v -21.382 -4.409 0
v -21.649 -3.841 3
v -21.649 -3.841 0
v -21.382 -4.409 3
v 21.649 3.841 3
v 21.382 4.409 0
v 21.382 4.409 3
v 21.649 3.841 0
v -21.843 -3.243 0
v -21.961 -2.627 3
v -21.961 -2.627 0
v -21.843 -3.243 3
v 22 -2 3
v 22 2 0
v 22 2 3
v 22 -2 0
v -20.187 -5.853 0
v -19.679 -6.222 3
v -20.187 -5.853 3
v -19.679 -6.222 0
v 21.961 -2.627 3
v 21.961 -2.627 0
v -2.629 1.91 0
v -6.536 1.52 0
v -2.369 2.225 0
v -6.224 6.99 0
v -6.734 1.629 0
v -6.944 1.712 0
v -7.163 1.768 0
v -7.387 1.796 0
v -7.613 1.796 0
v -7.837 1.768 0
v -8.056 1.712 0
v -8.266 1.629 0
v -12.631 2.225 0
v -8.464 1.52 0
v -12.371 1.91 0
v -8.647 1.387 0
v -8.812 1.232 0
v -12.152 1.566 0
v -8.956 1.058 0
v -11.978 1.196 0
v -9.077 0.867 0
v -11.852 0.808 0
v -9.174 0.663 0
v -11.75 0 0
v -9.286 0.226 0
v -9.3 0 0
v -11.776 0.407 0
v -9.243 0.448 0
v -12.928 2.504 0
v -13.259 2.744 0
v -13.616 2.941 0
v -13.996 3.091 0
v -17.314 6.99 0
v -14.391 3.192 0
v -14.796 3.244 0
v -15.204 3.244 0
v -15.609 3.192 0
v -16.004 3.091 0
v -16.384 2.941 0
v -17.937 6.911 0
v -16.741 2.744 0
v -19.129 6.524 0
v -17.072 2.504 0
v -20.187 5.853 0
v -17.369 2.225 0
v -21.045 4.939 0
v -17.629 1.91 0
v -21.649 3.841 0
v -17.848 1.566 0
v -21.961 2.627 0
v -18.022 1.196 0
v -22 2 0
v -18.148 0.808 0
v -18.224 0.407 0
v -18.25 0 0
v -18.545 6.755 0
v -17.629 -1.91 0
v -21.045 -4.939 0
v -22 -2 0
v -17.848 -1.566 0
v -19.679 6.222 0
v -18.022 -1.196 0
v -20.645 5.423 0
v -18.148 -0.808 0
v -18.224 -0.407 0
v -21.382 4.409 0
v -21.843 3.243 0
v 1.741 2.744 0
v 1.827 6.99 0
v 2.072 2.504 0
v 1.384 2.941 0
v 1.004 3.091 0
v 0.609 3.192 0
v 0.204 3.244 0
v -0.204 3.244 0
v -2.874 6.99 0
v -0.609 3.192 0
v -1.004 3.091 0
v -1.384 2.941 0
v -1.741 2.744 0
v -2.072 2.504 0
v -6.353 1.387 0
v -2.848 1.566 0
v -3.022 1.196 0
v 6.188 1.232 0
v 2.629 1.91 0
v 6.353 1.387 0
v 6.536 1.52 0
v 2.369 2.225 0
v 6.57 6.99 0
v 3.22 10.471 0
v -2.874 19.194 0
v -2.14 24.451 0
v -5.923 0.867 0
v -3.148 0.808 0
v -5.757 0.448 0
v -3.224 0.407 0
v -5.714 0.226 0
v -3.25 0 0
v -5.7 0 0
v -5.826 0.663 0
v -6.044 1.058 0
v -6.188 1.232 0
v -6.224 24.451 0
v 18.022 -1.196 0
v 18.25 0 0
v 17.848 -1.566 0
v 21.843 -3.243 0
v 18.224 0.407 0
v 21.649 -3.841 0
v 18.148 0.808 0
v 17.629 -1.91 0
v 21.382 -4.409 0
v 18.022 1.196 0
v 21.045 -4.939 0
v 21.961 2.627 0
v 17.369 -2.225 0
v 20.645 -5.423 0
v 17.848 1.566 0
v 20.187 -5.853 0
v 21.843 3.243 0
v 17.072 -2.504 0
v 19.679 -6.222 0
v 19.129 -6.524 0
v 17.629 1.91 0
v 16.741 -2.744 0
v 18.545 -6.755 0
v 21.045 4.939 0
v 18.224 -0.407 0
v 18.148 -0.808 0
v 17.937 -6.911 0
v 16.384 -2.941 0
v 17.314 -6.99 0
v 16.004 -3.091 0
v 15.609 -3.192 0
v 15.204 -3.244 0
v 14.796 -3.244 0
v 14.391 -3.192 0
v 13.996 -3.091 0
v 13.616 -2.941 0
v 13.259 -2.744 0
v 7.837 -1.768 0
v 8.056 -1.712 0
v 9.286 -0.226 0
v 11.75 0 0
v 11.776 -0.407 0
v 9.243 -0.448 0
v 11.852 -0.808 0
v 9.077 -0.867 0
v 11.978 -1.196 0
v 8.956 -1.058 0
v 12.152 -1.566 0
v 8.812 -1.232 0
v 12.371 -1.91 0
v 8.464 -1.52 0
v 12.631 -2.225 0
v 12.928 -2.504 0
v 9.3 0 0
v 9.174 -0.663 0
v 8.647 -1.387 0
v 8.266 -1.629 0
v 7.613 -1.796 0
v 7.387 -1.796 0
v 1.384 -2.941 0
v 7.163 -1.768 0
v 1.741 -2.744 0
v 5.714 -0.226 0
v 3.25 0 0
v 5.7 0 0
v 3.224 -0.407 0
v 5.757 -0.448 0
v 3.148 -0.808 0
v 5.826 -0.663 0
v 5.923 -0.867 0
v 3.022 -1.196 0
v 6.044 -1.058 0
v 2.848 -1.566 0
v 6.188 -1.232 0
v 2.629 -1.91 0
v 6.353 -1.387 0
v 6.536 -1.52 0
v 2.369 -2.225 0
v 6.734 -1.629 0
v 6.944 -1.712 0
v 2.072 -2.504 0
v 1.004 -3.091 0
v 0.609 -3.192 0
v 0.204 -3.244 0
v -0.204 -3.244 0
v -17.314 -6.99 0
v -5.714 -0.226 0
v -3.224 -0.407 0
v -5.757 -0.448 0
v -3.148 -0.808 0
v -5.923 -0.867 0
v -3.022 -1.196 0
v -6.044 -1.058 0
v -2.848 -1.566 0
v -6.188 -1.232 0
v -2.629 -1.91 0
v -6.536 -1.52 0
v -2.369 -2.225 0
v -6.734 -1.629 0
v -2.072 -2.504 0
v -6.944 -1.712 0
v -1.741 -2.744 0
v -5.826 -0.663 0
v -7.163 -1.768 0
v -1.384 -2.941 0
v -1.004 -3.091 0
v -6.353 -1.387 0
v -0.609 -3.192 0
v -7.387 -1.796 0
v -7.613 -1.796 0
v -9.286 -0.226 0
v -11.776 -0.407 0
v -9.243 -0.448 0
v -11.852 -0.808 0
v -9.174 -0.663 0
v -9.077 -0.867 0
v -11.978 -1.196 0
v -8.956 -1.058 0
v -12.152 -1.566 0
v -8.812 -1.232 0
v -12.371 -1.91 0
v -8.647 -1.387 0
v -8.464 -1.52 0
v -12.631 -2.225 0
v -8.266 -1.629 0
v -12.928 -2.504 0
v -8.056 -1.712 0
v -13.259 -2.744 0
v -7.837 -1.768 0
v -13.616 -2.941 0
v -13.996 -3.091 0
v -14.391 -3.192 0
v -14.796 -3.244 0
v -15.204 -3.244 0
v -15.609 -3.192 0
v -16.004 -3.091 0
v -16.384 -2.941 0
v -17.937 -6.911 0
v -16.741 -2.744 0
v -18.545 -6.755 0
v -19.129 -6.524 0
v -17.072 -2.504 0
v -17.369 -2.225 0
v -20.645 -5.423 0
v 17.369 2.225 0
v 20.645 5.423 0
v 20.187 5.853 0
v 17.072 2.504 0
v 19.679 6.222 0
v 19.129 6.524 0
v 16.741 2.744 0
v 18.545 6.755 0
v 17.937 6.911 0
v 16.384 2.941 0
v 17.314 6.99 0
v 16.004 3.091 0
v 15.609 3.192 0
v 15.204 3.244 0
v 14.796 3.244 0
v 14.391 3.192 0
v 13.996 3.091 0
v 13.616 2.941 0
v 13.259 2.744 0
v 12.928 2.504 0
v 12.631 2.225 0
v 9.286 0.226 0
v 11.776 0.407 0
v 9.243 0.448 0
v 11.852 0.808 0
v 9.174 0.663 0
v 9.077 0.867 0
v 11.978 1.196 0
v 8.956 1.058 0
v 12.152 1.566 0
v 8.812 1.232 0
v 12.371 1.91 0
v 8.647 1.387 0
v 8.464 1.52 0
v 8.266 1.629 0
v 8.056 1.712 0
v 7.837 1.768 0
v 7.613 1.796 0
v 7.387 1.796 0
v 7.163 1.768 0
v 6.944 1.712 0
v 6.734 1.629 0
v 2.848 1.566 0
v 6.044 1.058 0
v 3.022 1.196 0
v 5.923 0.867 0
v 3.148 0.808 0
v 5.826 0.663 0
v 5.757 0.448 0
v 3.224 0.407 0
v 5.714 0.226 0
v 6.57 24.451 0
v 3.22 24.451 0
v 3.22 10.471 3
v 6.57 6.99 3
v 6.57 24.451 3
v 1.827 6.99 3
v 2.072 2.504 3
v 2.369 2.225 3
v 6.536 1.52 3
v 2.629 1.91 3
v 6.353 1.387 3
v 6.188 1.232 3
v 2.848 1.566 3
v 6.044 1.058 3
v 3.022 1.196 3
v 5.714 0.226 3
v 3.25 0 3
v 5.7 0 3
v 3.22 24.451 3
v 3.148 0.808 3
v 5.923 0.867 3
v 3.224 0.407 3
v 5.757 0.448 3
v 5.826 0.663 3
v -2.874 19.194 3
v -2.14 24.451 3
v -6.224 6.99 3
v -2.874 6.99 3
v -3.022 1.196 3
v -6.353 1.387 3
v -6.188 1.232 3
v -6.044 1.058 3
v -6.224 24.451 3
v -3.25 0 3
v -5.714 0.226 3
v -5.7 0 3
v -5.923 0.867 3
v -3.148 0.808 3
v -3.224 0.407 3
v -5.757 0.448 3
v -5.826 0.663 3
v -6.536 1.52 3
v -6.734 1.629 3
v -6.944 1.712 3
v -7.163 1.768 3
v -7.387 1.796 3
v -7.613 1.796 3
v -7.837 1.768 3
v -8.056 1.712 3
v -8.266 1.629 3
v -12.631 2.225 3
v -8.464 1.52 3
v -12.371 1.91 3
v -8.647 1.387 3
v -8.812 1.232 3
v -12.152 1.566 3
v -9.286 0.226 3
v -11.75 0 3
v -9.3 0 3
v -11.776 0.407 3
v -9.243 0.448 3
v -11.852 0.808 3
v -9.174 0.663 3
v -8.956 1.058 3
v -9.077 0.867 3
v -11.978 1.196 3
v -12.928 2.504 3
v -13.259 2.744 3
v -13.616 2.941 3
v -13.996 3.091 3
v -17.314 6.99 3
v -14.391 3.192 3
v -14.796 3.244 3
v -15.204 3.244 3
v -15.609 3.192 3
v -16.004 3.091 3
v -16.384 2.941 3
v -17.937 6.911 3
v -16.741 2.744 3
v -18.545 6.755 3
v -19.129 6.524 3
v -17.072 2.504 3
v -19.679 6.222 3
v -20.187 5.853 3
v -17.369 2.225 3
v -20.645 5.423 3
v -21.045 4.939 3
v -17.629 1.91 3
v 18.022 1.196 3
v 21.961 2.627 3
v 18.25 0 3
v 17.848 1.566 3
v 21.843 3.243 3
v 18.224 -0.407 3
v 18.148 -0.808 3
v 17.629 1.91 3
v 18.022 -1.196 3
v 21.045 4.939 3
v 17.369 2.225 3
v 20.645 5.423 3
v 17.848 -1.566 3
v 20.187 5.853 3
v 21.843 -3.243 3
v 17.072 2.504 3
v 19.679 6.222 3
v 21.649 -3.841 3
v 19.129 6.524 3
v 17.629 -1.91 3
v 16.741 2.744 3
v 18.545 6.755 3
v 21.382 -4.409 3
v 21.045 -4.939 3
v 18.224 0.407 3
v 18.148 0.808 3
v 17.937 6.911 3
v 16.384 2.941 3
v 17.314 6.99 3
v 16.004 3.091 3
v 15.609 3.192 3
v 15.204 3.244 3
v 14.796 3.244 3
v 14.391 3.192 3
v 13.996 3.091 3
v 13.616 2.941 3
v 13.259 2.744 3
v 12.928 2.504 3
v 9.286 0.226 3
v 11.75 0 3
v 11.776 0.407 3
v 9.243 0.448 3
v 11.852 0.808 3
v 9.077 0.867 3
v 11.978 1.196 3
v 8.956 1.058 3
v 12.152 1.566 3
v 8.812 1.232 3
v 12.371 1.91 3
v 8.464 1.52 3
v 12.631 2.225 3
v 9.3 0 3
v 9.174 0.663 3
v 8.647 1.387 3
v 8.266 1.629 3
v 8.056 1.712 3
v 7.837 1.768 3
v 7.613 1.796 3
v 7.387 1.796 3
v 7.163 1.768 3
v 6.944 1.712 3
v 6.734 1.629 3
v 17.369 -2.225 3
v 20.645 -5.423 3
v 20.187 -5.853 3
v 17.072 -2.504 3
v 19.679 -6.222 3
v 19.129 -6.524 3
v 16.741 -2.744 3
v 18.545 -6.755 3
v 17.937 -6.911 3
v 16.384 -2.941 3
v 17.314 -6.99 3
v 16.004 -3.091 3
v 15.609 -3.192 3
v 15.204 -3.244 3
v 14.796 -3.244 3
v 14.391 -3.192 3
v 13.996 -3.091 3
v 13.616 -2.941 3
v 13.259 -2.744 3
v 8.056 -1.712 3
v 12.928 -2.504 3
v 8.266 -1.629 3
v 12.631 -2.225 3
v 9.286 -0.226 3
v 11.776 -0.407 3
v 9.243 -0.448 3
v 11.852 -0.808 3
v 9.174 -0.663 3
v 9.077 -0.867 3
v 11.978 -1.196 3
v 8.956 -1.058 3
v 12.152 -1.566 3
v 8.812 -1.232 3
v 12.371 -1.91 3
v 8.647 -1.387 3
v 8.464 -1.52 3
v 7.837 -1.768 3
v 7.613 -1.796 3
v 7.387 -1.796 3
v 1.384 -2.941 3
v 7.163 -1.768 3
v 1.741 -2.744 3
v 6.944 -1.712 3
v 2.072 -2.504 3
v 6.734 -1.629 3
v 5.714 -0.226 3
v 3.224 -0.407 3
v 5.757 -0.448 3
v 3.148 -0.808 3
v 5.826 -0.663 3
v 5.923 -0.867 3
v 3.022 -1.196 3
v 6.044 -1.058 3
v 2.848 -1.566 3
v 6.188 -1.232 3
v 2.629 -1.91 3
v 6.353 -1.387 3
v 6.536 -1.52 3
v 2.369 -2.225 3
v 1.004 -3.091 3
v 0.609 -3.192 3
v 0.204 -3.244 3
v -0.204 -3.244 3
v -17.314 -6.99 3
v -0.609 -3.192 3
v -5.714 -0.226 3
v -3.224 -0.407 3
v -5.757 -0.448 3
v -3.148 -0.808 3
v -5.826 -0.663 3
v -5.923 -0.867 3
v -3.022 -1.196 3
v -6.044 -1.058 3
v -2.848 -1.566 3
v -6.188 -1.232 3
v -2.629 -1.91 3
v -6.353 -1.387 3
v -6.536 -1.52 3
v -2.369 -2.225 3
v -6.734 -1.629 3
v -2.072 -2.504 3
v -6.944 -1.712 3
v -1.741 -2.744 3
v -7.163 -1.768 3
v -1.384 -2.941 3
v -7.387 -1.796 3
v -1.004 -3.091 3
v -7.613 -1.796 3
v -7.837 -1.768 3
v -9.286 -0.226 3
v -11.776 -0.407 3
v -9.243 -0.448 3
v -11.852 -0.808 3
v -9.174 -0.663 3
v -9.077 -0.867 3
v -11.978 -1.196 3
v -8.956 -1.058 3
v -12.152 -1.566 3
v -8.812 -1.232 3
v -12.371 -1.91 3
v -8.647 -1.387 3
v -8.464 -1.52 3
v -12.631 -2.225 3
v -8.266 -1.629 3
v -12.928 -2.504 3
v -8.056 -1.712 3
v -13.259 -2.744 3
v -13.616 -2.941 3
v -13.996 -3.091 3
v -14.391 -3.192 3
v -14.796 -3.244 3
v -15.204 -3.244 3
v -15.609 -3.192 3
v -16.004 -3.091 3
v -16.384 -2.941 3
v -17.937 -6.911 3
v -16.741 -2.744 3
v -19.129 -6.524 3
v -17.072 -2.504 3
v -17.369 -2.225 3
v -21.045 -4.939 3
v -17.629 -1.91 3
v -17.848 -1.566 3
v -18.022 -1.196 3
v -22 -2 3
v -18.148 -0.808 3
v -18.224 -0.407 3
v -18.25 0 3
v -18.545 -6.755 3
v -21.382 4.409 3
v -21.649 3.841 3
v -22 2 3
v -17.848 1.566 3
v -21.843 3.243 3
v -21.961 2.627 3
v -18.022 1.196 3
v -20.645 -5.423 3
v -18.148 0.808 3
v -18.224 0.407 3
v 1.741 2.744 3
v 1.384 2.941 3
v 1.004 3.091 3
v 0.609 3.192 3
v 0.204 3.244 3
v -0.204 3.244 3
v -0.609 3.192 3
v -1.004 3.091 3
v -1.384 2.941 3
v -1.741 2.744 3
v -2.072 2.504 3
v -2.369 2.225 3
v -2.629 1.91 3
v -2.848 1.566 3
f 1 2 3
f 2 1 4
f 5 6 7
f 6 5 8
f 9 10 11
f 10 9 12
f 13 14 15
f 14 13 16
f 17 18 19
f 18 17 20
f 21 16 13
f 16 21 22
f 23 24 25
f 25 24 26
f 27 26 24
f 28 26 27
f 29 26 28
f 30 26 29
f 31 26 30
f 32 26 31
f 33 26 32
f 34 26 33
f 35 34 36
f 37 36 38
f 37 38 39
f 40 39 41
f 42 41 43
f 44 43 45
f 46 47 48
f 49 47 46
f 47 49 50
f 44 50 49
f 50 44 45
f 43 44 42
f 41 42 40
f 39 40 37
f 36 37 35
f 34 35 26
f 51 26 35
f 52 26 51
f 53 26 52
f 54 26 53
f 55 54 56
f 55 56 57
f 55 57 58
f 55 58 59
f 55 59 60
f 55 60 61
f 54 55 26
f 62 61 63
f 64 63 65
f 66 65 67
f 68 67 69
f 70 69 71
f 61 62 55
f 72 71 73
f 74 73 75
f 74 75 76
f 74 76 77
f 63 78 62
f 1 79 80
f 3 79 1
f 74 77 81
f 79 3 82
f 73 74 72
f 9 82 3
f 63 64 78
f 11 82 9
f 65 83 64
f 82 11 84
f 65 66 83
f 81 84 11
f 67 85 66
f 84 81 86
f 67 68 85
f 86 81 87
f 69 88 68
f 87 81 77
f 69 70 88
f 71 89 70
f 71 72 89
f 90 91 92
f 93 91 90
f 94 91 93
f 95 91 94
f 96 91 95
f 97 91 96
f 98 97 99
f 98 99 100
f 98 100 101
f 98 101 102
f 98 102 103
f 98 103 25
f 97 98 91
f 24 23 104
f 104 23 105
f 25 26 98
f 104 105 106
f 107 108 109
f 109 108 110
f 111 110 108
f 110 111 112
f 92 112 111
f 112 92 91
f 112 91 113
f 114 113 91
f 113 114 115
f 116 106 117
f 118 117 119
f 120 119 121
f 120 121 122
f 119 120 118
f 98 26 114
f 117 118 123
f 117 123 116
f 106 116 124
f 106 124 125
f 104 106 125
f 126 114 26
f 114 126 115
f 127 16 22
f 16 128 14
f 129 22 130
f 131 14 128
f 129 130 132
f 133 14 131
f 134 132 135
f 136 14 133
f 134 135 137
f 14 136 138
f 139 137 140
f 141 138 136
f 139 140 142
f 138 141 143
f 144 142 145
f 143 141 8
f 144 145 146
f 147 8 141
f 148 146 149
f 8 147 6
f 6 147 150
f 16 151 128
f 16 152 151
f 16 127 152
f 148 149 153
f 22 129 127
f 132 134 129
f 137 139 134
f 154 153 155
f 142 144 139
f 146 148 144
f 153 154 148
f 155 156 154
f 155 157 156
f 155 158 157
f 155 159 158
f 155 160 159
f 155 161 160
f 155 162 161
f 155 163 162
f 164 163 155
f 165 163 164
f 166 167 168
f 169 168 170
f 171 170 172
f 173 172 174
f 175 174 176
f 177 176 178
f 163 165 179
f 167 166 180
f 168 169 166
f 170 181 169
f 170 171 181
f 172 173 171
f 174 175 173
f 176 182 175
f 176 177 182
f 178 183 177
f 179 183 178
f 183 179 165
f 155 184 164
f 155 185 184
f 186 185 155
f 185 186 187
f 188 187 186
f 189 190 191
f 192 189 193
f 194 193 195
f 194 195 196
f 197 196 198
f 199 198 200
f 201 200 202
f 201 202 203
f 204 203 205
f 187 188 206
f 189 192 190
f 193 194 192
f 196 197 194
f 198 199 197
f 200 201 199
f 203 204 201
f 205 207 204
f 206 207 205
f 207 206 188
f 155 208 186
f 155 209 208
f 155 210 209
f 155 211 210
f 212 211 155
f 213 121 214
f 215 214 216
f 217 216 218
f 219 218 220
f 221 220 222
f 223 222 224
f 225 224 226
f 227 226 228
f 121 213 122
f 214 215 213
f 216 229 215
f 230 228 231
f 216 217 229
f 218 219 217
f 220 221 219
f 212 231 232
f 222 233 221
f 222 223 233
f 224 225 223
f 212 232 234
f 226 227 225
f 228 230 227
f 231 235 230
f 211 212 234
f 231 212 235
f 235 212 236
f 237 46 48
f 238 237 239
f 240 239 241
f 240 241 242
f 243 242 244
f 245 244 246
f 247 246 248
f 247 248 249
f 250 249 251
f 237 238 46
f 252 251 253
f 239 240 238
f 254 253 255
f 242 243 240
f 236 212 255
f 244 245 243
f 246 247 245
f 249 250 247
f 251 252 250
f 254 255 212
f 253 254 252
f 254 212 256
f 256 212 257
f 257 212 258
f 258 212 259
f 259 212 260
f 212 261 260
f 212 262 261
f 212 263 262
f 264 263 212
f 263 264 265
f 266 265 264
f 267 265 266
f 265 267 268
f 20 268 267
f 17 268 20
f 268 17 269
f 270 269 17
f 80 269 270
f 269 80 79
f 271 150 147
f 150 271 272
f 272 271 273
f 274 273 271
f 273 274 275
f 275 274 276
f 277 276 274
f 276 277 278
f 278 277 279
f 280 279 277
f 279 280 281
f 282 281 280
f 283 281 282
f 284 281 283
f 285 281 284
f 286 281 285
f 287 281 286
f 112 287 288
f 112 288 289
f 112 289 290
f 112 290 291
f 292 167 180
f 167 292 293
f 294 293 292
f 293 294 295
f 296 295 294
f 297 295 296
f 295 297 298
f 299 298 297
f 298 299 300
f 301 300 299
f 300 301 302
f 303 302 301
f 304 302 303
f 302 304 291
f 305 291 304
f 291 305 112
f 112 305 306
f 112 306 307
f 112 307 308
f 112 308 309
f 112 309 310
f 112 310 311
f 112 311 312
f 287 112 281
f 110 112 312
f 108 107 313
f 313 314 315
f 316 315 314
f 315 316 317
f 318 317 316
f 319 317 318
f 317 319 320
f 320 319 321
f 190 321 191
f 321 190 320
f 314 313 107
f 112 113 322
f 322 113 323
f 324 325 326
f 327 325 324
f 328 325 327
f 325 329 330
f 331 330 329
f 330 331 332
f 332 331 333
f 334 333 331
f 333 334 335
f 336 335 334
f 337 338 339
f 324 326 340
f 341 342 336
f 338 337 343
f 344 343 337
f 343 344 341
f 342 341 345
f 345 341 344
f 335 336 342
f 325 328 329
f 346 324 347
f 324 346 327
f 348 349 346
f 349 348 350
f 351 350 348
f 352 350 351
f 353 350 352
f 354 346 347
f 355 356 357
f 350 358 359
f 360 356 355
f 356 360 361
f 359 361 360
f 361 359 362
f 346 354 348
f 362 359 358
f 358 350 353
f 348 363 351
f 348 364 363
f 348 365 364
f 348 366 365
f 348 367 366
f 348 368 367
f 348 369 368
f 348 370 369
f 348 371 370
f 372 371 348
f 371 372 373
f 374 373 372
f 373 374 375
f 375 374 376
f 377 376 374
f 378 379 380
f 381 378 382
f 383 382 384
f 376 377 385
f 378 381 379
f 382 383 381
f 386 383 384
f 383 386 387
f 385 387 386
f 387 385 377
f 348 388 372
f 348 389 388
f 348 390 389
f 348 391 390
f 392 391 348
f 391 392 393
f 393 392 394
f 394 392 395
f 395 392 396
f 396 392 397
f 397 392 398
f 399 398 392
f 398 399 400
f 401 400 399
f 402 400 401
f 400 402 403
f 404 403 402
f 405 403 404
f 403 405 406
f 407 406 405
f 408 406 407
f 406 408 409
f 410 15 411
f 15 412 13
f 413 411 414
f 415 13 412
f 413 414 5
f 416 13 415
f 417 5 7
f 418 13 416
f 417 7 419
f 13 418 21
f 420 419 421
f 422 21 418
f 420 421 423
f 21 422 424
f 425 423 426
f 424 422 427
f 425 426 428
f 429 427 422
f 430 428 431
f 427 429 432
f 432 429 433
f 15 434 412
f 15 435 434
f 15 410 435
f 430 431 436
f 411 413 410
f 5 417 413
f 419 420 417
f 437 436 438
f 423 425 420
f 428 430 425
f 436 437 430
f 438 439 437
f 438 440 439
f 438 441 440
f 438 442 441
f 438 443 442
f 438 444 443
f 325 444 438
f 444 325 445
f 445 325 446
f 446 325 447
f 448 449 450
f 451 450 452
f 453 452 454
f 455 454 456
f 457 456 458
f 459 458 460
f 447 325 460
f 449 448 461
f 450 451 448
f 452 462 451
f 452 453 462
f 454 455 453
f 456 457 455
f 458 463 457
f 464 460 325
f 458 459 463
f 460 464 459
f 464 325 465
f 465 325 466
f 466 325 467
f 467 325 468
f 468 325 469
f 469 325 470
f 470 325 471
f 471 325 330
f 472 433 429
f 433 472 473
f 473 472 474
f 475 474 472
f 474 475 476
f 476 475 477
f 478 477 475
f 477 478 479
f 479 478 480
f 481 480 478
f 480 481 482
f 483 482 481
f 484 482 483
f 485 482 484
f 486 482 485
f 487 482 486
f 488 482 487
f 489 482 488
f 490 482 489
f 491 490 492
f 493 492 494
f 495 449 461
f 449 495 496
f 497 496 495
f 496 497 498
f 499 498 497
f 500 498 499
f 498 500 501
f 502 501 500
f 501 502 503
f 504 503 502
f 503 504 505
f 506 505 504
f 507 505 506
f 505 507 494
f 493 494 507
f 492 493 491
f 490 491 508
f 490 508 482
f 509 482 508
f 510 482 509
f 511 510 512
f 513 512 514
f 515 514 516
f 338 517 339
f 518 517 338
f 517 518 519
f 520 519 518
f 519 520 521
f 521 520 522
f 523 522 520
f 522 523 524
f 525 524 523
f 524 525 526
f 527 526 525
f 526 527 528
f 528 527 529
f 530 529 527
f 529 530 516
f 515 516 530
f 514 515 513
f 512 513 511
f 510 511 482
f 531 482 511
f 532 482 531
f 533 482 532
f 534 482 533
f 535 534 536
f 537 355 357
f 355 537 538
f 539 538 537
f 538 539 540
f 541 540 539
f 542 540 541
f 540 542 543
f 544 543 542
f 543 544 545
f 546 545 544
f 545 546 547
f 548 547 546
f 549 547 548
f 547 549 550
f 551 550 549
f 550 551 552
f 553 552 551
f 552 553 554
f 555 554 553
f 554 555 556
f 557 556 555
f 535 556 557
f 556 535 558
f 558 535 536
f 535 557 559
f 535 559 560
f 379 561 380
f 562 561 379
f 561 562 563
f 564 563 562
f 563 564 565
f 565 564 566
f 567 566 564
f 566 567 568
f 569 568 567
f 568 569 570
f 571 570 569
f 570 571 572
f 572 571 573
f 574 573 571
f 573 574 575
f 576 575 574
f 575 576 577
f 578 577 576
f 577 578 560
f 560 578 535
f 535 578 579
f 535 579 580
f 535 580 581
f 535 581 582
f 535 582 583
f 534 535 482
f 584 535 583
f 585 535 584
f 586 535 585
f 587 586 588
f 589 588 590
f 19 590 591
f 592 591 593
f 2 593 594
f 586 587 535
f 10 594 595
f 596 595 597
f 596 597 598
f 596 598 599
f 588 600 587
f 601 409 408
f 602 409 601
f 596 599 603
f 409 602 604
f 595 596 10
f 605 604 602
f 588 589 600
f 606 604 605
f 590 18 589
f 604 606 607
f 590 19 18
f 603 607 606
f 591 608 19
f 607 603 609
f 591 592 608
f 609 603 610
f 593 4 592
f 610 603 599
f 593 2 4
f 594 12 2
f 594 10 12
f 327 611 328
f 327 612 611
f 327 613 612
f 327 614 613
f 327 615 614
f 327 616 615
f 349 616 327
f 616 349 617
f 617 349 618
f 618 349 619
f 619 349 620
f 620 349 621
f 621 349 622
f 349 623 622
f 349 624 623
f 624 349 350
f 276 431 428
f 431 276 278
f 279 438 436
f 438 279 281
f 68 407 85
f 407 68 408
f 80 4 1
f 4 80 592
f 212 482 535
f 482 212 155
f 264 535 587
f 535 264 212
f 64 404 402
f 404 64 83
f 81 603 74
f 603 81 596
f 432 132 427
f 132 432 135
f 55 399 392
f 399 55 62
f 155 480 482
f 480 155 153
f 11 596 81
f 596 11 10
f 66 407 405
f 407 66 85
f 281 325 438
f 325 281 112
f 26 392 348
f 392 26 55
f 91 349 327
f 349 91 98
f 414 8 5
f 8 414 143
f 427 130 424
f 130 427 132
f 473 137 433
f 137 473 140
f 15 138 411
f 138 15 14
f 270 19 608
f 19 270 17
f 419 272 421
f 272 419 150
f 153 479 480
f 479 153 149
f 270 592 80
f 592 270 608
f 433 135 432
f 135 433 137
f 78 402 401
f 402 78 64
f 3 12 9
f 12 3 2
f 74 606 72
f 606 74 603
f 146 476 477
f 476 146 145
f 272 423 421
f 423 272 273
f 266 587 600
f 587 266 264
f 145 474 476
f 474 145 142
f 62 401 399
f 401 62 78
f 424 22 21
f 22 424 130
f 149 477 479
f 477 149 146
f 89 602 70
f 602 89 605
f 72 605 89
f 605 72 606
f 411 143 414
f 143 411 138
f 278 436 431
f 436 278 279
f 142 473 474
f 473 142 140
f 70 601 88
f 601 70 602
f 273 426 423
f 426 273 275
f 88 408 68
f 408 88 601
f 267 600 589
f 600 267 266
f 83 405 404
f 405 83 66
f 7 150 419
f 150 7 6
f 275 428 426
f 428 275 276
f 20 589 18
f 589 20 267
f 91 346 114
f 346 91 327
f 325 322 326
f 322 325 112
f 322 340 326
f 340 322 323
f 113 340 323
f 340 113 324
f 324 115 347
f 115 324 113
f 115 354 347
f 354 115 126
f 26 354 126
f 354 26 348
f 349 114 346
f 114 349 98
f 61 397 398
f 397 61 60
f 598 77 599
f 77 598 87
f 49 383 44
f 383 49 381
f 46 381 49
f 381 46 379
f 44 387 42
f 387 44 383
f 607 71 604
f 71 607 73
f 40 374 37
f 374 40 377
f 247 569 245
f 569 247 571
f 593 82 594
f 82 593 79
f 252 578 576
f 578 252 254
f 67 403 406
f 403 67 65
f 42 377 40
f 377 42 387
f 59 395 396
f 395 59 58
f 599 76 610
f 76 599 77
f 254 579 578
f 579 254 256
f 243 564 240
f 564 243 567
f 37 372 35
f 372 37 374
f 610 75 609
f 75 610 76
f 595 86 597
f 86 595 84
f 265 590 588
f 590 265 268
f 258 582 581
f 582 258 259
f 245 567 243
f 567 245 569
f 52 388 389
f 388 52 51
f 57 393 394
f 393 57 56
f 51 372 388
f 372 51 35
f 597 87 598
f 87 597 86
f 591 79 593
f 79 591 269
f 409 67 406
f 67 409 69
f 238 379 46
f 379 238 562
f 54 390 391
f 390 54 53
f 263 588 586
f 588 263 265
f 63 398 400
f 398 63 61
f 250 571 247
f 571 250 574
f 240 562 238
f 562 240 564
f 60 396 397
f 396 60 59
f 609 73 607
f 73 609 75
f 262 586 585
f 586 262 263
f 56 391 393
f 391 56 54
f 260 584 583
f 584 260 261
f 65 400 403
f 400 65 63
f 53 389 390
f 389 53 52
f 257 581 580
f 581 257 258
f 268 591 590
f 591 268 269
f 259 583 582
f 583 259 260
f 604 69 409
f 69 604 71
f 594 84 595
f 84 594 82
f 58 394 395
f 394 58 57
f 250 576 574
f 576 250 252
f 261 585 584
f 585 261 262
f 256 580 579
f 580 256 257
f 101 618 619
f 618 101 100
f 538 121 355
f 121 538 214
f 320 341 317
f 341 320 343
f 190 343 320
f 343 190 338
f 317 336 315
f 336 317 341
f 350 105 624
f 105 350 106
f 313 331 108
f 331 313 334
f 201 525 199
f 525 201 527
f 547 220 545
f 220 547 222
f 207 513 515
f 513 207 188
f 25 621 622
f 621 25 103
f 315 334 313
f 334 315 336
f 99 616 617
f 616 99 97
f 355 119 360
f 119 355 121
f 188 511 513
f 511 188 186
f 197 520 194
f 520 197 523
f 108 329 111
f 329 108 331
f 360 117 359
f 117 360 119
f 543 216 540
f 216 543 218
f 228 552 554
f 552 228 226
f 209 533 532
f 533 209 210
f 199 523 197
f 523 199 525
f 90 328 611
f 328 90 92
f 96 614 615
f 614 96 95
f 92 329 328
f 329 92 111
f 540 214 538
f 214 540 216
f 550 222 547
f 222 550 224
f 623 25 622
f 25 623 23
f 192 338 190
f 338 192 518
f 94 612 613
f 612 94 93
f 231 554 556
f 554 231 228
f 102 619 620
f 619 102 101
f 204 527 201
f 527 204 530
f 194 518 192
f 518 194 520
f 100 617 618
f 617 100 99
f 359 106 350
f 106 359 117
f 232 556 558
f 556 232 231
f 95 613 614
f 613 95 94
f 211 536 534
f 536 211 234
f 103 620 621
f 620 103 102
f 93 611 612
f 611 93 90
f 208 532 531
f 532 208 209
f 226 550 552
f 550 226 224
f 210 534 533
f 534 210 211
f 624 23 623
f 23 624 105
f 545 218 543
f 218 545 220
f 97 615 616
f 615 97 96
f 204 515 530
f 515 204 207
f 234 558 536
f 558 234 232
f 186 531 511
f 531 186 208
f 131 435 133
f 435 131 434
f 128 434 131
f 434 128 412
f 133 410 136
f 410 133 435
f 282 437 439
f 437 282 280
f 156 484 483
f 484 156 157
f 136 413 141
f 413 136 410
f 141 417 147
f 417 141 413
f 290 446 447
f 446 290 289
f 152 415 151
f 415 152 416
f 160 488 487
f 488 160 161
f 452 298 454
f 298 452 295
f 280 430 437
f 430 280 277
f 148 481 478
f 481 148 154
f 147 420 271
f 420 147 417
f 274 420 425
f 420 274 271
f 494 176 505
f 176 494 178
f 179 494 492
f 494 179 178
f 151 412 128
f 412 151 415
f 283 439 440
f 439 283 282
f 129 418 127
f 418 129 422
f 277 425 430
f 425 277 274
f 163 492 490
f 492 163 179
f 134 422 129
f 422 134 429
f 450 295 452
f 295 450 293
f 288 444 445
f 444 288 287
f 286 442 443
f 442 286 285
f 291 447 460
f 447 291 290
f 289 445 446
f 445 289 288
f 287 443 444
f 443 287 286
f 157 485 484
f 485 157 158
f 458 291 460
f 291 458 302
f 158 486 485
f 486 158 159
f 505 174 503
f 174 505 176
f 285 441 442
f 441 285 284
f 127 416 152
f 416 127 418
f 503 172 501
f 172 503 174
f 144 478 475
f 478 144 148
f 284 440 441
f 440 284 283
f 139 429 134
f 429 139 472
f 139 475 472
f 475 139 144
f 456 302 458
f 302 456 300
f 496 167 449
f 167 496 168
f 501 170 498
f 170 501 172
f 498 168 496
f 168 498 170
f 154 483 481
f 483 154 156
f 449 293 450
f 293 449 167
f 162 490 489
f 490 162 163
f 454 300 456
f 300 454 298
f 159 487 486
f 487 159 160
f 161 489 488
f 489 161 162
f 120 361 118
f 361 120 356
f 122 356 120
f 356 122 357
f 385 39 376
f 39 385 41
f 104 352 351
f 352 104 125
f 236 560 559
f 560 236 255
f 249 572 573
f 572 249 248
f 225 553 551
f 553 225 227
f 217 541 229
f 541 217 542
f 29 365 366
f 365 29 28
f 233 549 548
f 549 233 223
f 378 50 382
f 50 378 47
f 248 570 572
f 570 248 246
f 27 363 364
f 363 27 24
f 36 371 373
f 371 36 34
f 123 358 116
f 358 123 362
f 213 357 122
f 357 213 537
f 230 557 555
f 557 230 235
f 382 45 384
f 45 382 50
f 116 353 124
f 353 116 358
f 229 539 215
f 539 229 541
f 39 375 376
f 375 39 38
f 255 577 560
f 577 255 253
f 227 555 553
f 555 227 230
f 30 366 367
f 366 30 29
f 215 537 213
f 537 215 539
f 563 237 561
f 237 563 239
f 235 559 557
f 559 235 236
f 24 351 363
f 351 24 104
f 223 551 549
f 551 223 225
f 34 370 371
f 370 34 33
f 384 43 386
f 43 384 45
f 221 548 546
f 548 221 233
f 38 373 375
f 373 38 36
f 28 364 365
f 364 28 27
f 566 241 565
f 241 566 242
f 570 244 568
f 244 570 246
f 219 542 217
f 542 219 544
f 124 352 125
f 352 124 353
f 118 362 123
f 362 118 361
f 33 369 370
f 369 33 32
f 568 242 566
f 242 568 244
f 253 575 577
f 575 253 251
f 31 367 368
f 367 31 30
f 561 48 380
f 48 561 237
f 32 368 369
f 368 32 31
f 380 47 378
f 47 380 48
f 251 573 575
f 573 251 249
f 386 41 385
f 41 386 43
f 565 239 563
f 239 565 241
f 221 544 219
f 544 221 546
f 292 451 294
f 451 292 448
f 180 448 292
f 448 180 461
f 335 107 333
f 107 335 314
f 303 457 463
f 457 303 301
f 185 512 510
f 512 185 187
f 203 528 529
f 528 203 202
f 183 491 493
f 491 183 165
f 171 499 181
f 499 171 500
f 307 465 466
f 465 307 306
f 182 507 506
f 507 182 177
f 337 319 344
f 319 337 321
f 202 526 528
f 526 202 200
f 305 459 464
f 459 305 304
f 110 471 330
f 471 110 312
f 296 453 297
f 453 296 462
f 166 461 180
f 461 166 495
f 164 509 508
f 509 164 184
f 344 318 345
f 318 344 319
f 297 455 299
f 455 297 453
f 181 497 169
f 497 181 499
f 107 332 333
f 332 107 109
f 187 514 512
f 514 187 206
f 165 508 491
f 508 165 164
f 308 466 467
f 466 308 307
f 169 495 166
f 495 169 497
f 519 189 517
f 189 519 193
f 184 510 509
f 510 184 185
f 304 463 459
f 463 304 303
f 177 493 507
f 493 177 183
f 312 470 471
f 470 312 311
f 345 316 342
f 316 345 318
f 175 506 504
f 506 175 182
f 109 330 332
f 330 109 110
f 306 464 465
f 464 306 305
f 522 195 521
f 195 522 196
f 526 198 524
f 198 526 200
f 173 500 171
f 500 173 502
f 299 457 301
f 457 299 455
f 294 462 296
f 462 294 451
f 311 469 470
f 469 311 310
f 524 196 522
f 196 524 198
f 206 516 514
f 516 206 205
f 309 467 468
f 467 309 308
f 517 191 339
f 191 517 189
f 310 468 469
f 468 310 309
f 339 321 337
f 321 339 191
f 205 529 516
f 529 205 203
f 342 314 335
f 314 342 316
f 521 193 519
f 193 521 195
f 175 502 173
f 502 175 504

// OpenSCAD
$fn = 50;


difference() {
	union() {
		hull() {
			translate(v = [-17.0000000000, 2.0000000000, 0]) {
				cylinder(h = 3, r = 5);
			}
			translate(v = [17.0000000000, 2.0000000000, 0]) {
				cylinder(h = 3, r = 5);
			}
			translate(v = [-17.0000000000, -2.0000000000, 0]) {
				cylinder(h = 3, r = 5);
			}
			translate(v = [17.0000000000, -2.0000000000, 0]) {
				cylinder(h = 3, r = 5);
			}
		}
		translate(v = [0, 24, 0]) {
			linear_extrude(height = 3) {
				text(font = "DejaVu Sans Mono:style=Bold", halign = "center", size = 19.0000000000, text = "N", valign = "top");
			}
		}
	}
	union() {
		translate(v = [-15.0000000000, 0.0000000000, 0]) {
			translate(v = [0, 0, -100]) {
				cylinder(h = 200, r = 3.2500000000);
			}
		}
		translate(v = [0, 0, -100]) {
			cylinder(h = 200, r = 3.2500000000);
		}
		translate(v = [15.0000000000, 0.0000000000, 0]) {
			translate(v = [0, 0, -100]) {
				cylinder(h = 200, r = 3.2500000000);
			}
		}
		translate(v = [-15.0000000000, 0.0000000000, 0]) {
			translate(v = [0, 0, -100]) {
				cylinder(h = 200, r = 1.8000000000);
			}
		}
		translate(v = [-7.5000000000, 0.0000000000, 0]) {
			translate(v = [0, 0, -100]) {
				cylinder(h = 200, r = 1.8000000000);
			}
		}
		translate(v = [0, 0, -100]) {
			cylinder(h = 200, r = 1.8000000000);
		}
		translate(v = [7.5000000000, 0.0000000000, 0]) {
			translate(v = [0, 0, -100]) {
				cylinder(h = 200, r = 1.8000000000);
			}
		}
		translate(v = [15.0000000000, 0.0000000000, 0]) {
			translate(v = [0, 0, -100]) {
				cylinder(h = 200, r = 1.8000000000);
			}
		}
	}
}
